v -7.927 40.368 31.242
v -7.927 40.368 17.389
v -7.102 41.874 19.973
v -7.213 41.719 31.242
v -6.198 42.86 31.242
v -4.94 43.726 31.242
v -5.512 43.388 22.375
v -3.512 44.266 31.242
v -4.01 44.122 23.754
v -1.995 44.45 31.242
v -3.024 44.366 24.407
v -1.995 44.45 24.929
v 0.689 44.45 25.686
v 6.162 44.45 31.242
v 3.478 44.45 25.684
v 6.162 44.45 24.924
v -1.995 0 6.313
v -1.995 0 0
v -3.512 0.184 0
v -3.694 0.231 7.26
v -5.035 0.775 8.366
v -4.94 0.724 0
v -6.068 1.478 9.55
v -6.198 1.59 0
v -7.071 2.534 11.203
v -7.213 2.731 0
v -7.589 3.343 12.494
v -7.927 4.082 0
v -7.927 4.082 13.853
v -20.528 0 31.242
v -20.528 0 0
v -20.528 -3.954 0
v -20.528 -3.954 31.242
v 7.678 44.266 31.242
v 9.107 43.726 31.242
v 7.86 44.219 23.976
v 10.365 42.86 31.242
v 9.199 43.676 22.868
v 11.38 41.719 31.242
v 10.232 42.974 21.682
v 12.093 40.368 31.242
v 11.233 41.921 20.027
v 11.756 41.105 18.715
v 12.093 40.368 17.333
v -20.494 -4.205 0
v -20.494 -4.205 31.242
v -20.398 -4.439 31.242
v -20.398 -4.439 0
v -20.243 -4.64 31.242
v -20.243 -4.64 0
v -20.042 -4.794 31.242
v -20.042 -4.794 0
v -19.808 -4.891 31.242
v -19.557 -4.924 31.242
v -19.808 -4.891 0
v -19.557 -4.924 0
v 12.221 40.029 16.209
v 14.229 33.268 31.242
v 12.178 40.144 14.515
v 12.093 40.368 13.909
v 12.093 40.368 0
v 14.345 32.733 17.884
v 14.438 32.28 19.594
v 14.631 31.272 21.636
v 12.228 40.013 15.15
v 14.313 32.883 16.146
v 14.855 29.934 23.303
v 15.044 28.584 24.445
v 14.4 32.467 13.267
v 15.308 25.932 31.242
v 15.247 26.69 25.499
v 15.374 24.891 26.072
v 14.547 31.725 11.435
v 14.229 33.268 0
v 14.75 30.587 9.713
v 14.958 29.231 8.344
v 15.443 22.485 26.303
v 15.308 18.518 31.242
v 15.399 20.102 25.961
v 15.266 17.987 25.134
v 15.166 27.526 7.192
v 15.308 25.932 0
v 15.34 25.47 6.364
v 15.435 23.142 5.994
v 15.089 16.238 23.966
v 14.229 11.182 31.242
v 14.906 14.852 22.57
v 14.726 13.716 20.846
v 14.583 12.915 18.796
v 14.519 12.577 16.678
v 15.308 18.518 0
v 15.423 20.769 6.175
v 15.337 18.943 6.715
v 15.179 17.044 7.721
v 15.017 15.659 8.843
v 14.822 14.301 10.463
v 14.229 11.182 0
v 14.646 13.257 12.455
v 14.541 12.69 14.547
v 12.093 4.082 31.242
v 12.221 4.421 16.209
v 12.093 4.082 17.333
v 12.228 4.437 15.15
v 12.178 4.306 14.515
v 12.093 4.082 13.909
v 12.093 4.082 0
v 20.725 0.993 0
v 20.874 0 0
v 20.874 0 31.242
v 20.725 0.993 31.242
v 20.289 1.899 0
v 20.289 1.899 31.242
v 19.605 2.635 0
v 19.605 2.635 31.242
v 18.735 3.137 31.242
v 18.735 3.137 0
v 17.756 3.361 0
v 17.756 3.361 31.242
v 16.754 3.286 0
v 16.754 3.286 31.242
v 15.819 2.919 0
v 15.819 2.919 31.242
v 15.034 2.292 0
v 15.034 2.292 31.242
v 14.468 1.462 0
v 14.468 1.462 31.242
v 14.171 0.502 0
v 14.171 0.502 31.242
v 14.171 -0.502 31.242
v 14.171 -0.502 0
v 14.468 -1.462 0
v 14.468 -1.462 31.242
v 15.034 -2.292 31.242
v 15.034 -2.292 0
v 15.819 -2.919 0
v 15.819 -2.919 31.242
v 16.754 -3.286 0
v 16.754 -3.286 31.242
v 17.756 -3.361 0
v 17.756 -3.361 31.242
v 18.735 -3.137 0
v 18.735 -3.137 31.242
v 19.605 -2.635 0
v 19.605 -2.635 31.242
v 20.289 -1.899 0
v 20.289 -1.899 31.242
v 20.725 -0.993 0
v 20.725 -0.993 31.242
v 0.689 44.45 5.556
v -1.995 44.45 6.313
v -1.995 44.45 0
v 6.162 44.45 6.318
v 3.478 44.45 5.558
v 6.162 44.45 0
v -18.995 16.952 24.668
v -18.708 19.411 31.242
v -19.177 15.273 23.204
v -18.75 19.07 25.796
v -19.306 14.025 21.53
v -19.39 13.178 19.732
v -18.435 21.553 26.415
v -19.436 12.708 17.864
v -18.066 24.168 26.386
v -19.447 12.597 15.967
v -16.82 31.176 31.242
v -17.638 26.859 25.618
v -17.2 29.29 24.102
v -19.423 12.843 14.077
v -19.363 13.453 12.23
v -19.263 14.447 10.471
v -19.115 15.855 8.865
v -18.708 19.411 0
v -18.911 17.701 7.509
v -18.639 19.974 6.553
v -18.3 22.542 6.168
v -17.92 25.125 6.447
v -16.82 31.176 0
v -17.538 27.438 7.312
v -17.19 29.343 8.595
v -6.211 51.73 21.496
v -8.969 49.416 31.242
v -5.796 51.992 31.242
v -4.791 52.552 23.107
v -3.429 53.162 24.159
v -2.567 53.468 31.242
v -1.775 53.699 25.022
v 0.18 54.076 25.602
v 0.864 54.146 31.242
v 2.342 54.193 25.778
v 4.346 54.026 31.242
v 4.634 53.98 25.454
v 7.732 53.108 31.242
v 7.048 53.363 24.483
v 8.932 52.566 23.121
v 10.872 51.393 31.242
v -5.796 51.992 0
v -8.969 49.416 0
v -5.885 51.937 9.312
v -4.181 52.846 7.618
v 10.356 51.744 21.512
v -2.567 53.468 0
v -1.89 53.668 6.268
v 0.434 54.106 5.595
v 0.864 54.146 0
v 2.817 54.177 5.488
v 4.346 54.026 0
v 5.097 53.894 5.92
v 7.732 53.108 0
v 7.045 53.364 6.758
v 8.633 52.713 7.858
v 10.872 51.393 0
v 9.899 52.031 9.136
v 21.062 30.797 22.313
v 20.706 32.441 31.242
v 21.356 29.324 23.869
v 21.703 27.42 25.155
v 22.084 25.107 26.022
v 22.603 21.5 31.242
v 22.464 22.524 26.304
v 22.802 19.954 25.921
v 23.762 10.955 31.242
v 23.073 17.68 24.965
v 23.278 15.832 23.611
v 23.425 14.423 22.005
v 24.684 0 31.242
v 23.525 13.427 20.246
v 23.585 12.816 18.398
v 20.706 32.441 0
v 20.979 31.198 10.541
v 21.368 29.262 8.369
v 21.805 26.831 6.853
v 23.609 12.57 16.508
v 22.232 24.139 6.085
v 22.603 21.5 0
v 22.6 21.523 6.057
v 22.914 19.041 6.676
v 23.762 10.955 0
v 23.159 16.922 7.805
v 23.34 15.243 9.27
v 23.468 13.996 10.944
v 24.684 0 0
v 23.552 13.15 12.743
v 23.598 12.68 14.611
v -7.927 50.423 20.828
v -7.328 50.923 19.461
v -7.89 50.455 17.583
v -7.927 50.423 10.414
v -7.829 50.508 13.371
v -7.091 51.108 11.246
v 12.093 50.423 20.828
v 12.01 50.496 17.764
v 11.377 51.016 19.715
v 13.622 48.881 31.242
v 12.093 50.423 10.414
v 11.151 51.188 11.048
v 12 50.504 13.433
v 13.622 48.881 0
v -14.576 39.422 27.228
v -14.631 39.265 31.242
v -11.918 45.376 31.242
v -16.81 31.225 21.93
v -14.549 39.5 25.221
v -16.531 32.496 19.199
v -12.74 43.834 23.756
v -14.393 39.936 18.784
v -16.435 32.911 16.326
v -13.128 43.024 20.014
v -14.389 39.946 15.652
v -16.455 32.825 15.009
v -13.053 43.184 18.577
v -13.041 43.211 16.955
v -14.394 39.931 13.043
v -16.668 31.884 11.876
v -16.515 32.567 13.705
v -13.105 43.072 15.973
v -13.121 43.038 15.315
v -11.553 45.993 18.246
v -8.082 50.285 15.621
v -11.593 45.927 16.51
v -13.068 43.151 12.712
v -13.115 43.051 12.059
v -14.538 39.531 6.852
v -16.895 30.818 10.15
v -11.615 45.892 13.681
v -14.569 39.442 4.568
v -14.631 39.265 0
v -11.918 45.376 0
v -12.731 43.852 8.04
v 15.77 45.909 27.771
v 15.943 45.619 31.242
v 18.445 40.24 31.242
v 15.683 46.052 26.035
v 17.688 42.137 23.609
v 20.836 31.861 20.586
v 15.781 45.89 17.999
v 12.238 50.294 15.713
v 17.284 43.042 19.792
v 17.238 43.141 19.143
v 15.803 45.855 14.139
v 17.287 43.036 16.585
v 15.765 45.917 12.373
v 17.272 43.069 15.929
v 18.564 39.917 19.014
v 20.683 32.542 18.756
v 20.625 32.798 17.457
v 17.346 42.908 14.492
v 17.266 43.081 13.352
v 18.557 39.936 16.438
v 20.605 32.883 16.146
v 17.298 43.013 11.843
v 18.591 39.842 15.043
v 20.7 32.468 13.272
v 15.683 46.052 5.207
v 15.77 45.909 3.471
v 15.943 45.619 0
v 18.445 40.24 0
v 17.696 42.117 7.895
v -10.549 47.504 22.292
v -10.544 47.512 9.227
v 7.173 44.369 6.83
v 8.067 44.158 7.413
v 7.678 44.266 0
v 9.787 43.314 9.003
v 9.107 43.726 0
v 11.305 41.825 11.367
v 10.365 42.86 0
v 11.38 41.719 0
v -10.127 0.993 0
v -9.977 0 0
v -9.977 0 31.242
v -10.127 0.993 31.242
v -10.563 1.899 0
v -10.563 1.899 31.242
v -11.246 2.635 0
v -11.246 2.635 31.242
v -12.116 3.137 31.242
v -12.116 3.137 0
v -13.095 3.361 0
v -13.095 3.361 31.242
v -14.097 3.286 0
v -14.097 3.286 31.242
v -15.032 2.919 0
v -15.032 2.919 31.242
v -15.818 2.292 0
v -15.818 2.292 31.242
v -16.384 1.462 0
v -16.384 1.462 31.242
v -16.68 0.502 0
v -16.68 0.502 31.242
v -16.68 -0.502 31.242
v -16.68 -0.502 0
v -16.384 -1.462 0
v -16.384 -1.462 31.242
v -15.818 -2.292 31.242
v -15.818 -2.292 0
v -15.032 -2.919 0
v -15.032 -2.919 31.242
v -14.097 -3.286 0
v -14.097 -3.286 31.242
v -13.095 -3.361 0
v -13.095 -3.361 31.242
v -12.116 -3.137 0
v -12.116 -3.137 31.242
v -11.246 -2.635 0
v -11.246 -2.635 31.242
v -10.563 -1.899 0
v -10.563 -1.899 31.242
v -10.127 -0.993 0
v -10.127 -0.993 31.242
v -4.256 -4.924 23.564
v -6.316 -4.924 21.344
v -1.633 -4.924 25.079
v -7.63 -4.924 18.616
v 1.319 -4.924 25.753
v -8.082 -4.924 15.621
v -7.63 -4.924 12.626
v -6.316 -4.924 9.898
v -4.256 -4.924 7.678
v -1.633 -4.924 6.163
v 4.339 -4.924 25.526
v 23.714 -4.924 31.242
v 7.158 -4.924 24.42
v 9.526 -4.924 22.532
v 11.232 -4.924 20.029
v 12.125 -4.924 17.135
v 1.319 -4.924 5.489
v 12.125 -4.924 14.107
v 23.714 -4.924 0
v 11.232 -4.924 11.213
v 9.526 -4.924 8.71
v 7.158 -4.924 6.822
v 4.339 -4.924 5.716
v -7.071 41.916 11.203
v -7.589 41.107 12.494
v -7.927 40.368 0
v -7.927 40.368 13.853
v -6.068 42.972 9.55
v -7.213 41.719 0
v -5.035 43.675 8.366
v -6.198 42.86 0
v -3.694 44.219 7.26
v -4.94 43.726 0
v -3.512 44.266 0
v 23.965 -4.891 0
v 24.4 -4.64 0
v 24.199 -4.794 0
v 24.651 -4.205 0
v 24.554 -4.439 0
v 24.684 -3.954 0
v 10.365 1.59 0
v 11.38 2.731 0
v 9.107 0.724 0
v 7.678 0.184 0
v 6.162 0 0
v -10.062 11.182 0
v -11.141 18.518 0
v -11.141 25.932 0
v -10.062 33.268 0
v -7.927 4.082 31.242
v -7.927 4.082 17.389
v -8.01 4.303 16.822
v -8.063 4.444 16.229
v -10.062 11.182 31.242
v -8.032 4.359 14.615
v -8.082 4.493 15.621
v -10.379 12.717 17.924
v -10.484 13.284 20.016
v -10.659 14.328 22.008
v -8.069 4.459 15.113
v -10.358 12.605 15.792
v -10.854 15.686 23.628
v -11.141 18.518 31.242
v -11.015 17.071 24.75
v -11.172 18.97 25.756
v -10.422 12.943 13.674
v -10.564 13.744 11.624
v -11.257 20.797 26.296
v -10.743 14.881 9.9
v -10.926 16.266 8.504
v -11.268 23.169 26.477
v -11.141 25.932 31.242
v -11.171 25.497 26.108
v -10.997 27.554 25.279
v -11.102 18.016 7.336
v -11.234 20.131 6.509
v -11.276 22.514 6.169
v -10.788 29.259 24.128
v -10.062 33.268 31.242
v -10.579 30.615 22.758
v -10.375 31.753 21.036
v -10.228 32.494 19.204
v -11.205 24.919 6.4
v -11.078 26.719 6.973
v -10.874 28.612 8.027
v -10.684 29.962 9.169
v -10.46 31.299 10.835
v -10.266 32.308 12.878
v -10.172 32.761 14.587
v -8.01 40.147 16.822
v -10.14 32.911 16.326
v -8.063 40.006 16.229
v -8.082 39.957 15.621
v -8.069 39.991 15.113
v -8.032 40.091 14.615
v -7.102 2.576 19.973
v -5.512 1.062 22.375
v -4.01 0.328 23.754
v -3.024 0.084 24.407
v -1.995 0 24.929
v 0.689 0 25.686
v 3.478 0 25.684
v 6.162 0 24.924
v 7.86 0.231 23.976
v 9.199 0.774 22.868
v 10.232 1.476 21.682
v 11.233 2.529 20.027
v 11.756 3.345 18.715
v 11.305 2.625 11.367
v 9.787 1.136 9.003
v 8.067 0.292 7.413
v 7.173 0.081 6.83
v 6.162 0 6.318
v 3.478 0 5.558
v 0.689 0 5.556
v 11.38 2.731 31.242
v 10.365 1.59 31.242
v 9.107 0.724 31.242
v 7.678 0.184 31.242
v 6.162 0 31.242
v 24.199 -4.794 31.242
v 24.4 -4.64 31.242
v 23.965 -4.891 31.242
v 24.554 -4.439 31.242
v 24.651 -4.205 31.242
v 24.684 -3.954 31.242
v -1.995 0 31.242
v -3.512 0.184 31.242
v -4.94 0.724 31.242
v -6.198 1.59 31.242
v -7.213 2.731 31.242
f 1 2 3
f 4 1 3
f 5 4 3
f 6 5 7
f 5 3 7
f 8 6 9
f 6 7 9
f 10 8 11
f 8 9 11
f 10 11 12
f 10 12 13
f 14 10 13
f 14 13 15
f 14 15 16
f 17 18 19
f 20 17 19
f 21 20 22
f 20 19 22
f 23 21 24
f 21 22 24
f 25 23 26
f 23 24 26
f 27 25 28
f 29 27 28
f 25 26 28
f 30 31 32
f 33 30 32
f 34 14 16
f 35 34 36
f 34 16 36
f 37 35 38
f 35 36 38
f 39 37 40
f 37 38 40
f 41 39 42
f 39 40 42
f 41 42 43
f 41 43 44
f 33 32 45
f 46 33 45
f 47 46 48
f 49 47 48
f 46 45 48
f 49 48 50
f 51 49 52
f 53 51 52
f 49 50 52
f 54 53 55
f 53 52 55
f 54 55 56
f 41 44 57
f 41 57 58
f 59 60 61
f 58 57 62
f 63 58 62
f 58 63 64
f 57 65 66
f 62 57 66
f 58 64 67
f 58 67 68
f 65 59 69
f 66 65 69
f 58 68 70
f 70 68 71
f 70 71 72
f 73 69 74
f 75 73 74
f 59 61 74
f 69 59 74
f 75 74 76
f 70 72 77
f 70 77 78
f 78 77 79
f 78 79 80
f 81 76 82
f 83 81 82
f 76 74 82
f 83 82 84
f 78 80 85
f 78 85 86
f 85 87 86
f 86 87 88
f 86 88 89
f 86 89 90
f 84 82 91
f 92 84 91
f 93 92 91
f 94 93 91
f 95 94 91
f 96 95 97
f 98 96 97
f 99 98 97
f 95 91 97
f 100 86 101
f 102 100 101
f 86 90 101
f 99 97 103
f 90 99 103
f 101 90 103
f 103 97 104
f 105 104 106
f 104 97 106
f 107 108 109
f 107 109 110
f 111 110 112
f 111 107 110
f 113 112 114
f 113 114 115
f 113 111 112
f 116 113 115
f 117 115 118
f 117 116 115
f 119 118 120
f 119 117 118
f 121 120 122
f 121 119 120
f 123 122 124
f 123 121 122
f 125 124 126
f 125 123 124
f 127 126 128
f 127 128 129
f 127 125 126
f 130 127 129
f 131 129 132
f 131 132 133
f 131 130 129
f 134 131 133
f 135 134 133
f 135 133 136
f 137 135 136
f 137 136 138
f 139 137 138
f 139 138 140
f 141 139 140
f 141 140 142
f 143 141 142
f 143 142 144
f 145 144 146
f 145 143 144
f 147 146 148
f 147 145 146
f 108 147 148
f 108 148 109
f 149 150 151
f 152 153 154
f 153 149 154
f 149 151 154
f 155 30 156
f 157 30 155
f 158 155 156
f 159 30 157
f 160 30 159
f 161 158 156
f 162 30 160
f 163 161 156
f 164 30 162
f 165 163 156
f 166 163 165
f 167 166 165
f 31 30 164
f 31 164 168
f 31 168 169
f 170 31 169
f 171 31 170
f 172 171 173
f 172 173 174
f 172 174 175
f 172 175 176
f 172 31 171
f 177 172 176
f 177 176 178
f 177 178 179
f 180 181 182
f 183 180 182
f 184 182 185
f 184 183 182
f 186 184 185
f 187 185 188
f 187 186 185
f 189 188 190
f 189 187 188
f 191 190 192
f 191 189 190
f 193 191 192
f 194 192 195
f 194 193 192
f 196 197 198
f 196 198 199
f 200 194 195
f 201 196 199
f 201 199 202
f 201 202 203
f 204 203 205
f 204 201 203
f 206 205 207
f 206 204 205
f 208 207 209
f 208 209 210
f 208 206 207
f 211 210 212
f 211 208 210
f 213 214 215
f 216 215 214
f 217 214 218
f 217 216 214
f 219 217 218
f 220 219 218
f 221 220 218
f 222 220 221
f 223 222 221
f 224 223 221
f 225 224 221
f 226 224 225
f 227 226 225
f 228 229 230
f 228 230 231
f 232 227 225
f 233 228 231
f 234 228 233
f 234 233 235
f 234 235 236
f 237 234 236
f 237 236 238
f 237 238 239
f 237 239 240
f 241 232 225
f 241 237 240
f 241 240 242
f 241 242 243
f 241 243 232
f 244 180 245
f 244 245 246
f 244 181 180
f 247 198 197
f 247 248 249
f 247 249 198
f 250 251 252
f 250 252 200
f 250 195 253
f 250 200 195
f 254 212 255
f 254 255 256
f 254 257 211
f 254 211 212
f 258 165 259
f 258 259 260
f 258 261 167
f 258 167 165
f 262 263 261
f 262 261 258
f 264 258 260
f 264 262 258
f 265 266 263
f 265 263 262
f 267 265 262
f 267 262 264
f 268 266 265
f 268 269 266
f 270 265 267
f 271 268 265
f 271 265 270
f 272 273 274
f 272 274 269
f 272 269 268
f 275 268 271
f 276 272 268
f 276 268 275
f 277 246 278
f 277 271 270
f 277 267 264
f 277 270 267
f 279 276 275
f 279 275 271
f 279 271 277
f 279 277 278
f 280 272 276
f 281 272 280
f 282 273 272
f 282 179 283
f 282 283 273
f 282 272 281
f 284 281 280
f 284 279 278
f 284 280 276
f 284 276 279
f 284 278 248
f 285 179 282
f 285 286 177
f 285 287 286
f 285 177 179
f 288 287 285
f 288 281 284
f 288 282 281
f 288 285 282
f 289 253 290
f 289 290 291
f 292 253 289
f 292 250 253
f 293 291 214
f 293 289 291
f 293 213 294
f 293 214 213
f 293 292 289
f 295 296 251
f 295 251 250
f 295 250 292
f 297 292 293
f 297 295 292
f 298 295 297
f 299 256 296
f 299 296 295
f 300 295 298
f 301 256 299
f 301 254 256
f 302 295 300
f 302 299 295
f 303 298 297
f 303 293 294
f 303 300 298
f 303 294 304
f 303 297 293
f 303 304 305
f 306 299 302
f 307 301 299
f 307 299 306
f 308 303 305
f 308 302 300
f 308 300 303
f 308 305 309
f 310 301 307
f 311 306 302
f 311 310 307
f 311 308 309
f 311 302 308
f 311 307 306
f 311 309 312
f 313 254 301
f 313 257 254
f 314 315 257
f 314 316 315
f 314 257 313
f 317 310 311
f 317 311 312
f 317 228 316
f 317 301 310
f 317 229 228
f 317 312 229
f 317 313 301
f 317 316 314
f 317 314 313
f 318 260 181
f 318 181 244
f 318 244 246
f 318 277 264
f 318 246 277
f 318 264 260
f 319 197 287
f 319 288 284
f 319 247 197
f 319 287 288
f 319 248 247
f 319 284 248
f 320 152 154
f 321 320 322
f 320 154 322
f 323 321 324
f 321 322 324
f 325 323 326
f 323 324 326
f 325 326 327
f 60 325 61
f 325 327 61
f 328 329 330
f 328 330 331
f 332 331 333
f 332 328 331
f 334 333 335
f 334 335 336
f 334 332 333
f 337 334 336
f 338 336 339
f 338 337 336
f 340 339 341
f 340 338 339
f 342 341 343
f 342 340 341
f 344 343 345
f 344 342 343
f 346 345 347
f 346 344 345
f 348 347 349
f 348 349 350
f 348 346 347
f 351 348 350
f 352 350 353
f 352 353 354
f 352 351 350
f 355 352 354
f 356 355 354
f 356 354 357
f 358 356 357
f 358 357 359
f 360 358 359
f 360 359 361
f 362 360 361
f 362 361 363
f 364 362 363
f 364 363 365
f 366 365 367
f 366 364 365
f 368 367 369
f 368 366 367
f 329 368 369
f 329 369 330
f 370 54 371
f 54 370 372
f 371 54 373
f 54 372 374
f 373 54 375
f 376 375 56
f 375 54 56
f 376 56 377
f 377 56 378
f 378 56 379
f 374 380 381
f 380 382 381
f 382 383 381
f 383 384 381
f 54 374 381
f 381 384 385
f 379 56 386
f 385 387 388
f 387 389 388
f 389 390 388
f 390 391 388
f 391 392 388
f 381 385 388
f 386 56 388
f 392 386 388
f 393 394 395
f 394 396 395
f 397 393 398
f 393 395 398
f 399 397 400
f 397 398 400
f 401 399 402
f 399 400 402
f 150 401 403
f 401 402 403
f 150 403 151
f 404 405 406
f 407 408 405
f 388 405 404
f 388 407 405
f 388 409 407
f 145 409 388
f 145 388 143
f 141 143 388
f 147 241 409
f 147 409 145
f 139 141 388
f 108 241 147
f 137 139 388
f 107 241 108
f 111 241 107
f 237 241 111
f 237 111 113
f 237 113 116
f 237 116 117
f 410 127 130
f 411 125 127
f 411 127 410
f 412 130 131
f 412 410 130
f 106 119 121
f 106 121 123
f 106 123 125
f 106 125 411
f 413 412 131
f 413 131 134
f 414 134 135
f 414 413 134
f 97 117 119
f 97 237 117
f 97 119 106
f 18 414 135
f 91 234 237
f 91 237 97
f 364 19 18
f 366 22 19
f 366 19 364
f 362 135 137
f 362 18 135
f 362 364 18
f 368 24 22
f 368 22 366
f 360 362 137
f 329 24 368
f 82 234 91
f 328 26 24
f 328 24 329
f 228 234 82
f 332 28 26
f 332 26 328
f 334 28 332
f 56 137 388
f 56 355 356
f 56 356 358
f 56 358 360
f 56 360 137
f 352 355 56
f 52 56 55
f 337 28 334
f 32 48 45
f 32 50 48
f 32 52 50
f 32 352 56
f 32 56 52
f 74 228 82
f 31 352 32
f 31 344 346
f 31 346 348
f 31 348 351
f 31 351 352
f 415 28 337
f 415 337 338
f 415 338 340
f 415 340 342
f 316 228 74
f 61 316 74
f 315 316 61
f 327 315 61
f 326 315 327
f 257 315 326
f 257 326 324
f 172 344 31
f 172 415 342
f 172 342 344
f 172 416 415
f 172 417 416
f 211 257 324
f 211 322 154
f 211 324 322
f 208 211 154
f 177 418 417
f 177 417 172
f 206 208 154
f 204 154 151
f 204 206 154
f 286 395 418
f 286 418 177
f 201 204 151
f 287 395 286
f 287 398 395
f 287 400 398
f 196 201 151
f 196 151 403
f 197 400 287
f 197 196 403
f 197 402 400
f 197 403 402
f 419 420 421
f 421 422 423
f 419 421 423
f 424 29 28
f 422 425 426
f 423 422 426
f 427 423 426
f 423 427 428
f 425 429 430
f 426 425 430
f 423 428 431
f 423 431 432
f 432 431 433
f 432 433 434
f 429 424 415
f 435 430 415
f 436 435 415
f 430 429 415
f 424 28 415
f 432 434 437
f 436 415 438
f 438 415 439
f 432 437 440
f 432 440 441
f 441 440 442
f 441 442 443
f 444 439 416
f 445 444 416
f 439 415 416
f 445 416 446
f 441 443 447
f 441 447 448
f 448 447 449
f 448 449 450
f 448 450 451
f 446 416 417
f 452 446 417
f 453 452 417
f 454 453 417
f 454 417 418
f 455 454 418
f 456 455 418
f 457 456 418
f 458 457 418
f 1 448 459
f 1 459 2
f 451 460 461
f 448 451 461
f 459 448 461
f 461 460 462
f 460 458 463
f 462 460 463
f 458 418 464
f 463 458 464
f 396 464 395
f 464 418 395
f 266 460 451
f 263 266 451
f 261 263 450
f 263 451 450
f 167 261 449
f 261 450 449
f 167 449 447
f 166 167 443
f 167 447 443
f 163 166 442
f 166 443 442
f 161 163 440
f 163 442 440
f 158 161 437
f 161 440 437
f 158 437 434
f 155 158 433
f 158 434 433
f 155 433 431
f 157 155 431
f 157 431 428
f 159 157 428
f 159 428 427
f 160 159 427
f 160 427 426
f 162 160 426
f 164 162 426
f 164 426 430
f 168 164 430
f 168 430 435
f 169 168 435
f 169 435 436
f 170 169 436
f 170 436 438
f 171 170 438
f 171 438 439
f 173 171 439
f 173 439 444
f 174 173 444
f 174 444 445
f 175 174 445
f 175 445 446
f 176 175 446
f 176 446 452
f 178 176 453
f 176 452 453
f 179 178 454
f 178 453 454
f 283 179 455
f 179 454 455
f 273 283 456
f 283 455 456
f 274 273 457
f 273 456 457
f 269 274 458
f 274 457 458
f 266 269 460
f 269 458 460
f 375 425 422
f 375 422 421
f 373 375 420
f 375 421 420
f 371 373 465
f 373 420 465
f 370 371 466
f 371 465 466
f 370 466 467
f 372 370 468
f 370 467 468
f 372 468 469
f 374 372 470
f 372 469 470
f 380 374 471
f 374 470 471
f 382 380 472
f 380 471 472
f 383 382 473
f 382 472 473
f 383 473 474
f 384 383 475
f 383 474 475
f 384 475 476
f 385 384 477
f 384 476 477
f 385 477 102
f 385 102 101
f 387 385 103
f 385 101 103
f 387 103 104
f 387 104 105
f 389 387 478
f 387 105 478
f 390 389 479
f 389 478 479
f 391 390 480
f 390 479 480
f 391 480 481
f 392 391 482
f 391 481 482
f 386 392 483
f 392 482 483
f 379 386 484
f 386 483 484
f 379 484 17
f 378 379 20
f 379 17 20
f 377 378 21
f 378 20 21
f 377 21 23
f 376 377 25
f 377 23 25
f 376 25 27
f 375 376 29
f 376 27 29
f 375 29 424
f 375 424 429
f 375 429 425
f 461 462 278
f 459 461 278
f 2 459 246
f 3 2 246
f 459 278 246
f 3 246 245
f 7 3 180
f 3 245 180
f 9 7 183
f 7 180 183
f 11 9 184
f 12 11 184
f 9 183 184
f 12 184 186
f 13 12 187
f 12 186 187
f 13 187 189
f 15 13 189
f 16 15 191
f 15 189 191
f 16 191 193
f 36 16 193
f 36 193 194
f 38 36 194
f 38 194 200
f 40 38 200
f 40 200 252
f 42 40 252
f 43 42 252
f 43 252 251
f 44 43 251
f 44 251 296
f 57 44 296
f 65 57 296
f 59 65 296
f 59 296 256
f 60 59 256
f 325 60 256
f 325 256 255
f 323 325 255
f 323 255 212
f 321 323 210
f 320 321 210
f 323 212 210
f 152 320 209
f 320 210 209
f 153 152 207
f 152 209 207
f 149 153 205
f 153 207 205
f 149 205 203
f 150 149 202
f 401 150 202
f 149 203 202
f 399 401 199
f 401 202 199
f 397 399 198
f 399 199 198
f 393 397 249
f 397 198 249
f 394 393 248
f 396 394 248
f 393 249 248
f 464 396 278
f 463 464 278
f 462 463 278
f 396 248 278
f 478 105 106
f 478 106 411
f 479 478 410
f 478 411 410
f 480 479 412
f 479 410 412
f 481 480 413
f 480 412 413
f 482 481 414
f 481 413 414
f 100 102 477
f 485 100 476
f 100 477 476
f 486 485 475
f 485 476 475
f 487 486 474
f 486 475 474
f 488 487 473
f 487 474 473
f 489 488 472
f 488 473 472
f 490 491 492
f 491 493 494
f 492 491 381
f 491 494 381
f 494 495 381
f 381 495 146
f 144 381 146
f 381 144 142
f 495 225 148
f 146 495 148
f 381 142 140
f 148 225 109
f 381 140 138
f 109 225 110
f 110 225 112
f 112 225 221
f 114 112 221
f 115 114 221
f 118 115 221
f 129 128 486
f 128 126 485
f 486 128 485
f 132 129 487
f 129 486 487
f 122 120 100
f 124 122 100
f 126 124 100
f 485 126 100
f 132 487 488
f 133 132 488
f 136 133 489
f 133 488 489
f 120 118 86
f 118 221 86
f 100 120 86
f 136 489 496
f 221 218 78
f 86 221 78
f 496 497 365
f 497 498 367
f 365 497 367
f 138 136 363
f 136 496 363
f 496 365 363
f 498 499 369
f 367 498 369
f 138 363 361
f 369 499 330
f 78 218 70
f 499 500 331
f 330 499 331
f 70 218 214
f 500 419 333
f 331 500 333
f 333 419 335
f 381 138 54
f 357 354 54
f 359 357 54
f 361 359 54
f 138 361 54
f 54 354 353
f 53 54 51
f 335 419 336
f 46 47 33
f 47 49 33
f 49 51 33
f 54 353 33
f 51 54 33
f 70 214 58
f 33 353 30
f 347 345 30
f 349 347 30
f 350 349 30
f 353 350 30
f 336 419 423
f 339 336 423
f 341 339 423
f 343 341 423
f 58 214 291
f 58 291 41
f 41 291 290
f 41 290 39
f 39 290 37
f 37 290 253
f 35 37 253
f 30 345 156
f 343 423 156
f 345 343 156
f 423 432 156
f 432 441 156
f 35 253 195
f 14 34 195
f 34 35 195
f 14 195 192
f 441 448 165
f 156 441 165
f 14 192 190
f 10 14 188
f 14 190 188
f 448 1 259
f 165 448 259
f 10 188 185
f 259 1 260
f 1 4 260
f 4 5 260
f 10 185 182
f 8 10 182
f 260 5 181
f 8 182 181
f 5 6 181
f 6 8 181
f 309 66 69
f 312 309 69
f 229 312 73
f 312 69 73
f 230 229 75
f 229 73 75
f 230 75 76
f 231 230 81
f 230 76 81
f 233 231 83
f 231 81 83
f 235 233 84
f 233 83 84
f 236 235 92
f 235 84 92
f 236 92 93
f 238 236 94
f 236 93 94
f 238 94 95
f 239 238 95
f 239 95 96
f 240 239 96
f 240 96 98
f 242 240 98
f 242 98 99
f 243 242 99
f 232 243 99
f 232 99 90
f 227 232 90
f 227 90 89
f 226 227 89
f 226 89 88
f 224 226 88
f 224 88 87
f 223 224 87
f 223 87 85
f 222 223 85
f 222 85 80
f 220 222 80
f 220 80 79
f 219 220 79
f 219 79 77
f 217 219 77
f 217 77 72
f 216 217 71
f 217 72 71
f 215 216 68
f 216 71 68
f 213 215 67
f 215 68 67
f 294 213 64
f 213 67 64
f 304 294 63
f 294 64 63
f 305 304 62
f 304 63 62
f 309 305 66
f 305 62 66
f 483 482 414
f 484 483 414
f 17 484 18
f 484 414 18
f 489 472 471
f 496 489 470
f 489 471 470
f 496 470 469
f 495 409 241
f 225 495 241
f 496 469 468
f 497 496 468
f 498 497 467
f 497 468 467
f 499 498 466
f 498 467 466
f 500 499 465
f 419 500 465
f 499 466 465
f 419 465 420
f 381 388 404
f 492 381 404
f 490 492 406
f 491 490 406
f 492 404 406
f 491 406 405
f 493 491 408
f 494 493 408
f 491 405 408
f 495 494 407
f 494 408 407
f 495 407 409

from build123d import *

# Parameters (mm, degrees)
F0_R     = 3.3703172414
F1_DEPTH = 31.242
F3_D     = 20.32
F5_D     = 20.32
F5_DEPTH = 24.6854472867
F7_D     = 20.32
F7_DEPTH = 20.5285529133


with BuildPart() as f1:
    # F0 (on Top) → F1 (new body)
    with BuildSketch(Plane.XY):
        with BuildLine():
            add(Edge.make_bspline(
                [(-20.5275528133, 0), (-18.8275725492, 21.1597767899), (-16.0725191688, 55.4521246519), (20.2398365965, 55.4524849576), (22.9884533584, 21.1598002442), (24.6844471867, 0)],
                knots=[0, 0, 0, 0, 0.3815897165, 0.6184189667, 1, 1, 1, 1], degree=3))
            Line((-20.5275528133, 0), (-20.5275528133, -3.9536914555))
            ThreePointArc((-20.5275528133, -3.9536914555), (-20.2433772266, -4.639752011), (-19.5573166711, -4.9239275977))
            Line((-19.5573166711, -4.9239275977), (23.7142110445, -4.9239275977))
            ThreePointArc((23.7142110445, -4.9239275977), (24.4002716, -4.639752011), (24.6844471867, -3.9536914555))
            Line((24.6844471867, -3.9536914555), (24.6844471867, 0))
        make_face()
        with Locations((-13.3472355719, 0)):
            Circle(F0_R, mode=Mode.SUBTRACT)
        with Locations((17.5041299453, 0)):
            Circle(F0_R, mode=Mode.SUBTRACT)
        with BuildLine():
            Line((6.1620298816, 0), (-1.9953760516, 0))
            ThreePointArc((-1.9953760516, 0), (-5.5954876571, 1.1191591088), (-7.9265921141, 4.0821428571))
            ThreePointArc((-7.9265921141, 4.0821428571), (-11.2768636144, 22.225), (-7.9265921141, 40.3678571429))
            ThreePointArc((-7.9265921141, 40.3678571429), (-5.5954876571, 43.3308408912), (-1.9953760516, 44.45))
            Line((-1.9953760516, 44.45), (6.1620298816, 44.45))
            ThreePointArc((6.1620298816, 44.45), (9.762141487, 43.3308408912), (12.0932459441, 40.3678571429))
            ThreePointArc((12.0932459441, 40.3678571429), (15.4435174444, 22.225), (12.0932459441, 4.0821428571))
            ThreePointArc((12.0932459441, 4.0821428571), (9.762141487, 1.1191591088), (6.1620298816, 0))
        make_face(mode=Mode.SUBTRACT)
    extrude(amount=F1_DEPTH)

    # F3 (through all)
    with Locations(Plane.XZ.offset(4.9239275977)):
        with Locations((2.0784471867, 15.621)):
            Hole(F3_D / 2)

    # F5 (through all, one way)
    with BuildSketch(Plane(origin=(0, 0, 0), x_dir=(0, 1, 0), z_dir=(-1, 0, 0))):
        with Locations((22.7233208716, -16.145516187)):
            Circle(F5_D / 2)
    extrude(amount=-F5_DEPTH, mode=Mode.SUBTRACT)

    # F7 (through all, one way)
    with BuildSketch(Plane.YZ):
        with Locations((22.7505713701, 16.3258425891)):
            Circle(F7_D / 2)
    extrude(amount=-F7_DEPTH, mode=Mode.SUBTRACT)


solid = f1.part
